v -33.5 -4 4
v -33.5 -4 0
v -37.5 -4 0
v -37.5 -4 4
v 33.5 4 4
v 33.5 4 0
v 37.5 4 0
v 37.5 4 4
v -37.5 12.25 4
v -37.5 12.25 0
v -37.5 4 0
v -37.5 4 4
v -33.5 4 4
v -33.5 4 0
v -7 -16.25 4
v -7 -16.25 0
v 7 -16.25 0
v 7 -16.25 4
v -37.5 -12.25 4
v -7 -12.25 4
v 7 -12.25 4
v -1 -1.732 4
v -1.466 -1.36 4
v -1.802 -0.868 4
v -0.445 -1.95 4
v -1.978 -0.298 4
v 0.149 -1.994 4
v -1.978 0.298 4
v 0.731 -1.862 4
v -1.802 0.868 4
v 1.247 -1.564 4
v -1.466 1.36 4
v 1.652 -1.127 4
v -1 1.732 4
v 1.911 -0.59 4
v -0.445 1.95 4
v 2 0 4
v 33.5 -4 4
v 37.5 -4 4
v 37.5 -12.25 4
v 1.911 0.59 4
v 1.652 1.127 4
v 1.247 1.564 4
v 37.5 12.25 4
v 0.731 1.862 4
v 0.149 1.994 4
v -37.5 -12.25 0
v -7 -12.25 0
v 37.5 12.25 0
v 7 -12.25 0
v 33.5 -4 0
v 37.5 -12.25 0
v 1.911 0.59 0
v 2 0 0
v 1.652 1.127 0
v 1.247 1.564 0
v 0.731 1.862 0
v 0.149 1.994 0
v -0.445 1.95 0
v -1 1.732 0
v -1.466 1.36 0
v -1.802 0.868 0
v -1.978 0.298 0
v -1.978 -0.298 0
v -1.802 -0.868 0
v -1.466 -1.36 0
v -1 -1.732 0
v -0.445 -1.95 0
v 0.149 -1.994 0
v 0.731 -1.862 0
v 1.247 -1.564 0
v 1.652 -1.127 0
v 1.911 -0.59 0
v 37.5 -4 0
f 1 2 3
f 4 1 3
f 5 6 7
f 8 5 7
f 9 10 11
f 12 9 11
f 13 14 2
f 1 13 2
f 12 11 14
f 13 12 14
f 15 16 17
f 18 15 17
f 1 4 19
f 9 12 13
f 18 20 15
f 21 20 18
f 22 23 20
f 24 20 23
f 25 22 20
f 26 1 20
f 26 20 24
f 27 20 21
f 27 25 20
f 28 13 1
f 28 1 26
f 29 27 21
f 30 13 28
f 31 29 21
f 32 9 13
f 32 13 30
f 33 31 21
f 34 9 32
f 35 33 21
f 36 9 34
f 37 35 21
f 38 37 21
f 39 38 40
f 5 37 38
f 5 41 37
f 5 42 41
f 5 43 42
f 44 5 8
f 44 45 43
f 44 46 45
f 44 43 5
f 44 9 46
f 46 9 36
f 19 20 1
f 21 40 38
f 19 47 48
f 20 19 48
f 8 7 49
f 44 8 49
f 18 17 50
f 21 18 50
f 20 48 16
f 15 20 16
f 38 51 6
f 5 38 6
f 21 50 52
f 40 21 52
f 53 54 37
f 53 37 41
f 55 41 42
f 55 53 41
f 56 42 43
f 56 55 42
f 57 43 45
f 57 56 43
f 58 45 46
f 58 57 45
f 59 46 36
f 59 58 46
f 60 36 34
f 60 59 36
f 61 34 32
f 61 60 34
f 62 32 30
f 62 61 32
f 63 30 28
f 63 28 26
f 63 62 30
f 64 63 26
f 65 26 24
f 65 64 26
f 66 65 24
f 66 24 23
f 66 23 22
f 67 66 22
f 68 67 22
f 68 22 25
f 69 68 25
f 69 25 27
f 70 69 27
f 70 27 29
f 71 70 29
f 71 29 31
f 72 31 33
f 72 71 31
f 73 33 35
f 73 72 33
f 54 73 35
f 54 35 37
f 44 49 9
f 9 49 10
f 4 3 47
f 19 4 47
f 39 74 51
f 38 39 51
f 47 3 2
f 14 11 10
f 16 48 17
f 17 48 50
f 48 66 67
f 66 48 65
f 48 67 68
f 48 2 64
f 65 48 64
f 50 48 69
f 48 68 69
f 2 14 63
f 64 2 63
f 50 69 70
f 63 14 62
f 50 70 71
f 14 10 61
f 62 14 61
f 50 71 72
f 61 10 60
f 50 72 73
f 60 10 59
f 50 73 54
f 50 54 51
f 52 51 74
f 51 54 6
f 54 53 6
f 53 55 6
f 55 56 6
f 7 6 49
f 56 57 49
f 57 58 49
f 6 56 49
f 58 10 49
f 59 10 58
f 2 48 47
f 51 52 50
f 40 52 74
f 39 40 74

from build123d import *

# Parameters (mm, degrees)
CROQUIS1_R              = 2
SALIENTE_EXTRUIR1_DEPTH = 4


with BuildPart() as part:
    # Croquis1 → Saliente-Extruir1 (new body)
    with BuildSketch(Plane.XY):
        Polygon((37.5, 12.25), (-37.5, 12.25), (-37.5, 4), (-33.5, 4), (-33.5, -4), (-37.5, -4), (-37.5, -12.25), (-7, -12.25), (-7, -16.25), (7, -16.25), (7, -12.25), (37.5, -12.25), (37.5, -4), (33.5, -4), (33.5, 4), (37.5, 4), align=None)
        Circle(CROQUIS1_R, mode=Mode.SUBTRACT)
    extrude(amount=SALIENTE_EXTRUIR1_DEPTH)


solid = part.part
